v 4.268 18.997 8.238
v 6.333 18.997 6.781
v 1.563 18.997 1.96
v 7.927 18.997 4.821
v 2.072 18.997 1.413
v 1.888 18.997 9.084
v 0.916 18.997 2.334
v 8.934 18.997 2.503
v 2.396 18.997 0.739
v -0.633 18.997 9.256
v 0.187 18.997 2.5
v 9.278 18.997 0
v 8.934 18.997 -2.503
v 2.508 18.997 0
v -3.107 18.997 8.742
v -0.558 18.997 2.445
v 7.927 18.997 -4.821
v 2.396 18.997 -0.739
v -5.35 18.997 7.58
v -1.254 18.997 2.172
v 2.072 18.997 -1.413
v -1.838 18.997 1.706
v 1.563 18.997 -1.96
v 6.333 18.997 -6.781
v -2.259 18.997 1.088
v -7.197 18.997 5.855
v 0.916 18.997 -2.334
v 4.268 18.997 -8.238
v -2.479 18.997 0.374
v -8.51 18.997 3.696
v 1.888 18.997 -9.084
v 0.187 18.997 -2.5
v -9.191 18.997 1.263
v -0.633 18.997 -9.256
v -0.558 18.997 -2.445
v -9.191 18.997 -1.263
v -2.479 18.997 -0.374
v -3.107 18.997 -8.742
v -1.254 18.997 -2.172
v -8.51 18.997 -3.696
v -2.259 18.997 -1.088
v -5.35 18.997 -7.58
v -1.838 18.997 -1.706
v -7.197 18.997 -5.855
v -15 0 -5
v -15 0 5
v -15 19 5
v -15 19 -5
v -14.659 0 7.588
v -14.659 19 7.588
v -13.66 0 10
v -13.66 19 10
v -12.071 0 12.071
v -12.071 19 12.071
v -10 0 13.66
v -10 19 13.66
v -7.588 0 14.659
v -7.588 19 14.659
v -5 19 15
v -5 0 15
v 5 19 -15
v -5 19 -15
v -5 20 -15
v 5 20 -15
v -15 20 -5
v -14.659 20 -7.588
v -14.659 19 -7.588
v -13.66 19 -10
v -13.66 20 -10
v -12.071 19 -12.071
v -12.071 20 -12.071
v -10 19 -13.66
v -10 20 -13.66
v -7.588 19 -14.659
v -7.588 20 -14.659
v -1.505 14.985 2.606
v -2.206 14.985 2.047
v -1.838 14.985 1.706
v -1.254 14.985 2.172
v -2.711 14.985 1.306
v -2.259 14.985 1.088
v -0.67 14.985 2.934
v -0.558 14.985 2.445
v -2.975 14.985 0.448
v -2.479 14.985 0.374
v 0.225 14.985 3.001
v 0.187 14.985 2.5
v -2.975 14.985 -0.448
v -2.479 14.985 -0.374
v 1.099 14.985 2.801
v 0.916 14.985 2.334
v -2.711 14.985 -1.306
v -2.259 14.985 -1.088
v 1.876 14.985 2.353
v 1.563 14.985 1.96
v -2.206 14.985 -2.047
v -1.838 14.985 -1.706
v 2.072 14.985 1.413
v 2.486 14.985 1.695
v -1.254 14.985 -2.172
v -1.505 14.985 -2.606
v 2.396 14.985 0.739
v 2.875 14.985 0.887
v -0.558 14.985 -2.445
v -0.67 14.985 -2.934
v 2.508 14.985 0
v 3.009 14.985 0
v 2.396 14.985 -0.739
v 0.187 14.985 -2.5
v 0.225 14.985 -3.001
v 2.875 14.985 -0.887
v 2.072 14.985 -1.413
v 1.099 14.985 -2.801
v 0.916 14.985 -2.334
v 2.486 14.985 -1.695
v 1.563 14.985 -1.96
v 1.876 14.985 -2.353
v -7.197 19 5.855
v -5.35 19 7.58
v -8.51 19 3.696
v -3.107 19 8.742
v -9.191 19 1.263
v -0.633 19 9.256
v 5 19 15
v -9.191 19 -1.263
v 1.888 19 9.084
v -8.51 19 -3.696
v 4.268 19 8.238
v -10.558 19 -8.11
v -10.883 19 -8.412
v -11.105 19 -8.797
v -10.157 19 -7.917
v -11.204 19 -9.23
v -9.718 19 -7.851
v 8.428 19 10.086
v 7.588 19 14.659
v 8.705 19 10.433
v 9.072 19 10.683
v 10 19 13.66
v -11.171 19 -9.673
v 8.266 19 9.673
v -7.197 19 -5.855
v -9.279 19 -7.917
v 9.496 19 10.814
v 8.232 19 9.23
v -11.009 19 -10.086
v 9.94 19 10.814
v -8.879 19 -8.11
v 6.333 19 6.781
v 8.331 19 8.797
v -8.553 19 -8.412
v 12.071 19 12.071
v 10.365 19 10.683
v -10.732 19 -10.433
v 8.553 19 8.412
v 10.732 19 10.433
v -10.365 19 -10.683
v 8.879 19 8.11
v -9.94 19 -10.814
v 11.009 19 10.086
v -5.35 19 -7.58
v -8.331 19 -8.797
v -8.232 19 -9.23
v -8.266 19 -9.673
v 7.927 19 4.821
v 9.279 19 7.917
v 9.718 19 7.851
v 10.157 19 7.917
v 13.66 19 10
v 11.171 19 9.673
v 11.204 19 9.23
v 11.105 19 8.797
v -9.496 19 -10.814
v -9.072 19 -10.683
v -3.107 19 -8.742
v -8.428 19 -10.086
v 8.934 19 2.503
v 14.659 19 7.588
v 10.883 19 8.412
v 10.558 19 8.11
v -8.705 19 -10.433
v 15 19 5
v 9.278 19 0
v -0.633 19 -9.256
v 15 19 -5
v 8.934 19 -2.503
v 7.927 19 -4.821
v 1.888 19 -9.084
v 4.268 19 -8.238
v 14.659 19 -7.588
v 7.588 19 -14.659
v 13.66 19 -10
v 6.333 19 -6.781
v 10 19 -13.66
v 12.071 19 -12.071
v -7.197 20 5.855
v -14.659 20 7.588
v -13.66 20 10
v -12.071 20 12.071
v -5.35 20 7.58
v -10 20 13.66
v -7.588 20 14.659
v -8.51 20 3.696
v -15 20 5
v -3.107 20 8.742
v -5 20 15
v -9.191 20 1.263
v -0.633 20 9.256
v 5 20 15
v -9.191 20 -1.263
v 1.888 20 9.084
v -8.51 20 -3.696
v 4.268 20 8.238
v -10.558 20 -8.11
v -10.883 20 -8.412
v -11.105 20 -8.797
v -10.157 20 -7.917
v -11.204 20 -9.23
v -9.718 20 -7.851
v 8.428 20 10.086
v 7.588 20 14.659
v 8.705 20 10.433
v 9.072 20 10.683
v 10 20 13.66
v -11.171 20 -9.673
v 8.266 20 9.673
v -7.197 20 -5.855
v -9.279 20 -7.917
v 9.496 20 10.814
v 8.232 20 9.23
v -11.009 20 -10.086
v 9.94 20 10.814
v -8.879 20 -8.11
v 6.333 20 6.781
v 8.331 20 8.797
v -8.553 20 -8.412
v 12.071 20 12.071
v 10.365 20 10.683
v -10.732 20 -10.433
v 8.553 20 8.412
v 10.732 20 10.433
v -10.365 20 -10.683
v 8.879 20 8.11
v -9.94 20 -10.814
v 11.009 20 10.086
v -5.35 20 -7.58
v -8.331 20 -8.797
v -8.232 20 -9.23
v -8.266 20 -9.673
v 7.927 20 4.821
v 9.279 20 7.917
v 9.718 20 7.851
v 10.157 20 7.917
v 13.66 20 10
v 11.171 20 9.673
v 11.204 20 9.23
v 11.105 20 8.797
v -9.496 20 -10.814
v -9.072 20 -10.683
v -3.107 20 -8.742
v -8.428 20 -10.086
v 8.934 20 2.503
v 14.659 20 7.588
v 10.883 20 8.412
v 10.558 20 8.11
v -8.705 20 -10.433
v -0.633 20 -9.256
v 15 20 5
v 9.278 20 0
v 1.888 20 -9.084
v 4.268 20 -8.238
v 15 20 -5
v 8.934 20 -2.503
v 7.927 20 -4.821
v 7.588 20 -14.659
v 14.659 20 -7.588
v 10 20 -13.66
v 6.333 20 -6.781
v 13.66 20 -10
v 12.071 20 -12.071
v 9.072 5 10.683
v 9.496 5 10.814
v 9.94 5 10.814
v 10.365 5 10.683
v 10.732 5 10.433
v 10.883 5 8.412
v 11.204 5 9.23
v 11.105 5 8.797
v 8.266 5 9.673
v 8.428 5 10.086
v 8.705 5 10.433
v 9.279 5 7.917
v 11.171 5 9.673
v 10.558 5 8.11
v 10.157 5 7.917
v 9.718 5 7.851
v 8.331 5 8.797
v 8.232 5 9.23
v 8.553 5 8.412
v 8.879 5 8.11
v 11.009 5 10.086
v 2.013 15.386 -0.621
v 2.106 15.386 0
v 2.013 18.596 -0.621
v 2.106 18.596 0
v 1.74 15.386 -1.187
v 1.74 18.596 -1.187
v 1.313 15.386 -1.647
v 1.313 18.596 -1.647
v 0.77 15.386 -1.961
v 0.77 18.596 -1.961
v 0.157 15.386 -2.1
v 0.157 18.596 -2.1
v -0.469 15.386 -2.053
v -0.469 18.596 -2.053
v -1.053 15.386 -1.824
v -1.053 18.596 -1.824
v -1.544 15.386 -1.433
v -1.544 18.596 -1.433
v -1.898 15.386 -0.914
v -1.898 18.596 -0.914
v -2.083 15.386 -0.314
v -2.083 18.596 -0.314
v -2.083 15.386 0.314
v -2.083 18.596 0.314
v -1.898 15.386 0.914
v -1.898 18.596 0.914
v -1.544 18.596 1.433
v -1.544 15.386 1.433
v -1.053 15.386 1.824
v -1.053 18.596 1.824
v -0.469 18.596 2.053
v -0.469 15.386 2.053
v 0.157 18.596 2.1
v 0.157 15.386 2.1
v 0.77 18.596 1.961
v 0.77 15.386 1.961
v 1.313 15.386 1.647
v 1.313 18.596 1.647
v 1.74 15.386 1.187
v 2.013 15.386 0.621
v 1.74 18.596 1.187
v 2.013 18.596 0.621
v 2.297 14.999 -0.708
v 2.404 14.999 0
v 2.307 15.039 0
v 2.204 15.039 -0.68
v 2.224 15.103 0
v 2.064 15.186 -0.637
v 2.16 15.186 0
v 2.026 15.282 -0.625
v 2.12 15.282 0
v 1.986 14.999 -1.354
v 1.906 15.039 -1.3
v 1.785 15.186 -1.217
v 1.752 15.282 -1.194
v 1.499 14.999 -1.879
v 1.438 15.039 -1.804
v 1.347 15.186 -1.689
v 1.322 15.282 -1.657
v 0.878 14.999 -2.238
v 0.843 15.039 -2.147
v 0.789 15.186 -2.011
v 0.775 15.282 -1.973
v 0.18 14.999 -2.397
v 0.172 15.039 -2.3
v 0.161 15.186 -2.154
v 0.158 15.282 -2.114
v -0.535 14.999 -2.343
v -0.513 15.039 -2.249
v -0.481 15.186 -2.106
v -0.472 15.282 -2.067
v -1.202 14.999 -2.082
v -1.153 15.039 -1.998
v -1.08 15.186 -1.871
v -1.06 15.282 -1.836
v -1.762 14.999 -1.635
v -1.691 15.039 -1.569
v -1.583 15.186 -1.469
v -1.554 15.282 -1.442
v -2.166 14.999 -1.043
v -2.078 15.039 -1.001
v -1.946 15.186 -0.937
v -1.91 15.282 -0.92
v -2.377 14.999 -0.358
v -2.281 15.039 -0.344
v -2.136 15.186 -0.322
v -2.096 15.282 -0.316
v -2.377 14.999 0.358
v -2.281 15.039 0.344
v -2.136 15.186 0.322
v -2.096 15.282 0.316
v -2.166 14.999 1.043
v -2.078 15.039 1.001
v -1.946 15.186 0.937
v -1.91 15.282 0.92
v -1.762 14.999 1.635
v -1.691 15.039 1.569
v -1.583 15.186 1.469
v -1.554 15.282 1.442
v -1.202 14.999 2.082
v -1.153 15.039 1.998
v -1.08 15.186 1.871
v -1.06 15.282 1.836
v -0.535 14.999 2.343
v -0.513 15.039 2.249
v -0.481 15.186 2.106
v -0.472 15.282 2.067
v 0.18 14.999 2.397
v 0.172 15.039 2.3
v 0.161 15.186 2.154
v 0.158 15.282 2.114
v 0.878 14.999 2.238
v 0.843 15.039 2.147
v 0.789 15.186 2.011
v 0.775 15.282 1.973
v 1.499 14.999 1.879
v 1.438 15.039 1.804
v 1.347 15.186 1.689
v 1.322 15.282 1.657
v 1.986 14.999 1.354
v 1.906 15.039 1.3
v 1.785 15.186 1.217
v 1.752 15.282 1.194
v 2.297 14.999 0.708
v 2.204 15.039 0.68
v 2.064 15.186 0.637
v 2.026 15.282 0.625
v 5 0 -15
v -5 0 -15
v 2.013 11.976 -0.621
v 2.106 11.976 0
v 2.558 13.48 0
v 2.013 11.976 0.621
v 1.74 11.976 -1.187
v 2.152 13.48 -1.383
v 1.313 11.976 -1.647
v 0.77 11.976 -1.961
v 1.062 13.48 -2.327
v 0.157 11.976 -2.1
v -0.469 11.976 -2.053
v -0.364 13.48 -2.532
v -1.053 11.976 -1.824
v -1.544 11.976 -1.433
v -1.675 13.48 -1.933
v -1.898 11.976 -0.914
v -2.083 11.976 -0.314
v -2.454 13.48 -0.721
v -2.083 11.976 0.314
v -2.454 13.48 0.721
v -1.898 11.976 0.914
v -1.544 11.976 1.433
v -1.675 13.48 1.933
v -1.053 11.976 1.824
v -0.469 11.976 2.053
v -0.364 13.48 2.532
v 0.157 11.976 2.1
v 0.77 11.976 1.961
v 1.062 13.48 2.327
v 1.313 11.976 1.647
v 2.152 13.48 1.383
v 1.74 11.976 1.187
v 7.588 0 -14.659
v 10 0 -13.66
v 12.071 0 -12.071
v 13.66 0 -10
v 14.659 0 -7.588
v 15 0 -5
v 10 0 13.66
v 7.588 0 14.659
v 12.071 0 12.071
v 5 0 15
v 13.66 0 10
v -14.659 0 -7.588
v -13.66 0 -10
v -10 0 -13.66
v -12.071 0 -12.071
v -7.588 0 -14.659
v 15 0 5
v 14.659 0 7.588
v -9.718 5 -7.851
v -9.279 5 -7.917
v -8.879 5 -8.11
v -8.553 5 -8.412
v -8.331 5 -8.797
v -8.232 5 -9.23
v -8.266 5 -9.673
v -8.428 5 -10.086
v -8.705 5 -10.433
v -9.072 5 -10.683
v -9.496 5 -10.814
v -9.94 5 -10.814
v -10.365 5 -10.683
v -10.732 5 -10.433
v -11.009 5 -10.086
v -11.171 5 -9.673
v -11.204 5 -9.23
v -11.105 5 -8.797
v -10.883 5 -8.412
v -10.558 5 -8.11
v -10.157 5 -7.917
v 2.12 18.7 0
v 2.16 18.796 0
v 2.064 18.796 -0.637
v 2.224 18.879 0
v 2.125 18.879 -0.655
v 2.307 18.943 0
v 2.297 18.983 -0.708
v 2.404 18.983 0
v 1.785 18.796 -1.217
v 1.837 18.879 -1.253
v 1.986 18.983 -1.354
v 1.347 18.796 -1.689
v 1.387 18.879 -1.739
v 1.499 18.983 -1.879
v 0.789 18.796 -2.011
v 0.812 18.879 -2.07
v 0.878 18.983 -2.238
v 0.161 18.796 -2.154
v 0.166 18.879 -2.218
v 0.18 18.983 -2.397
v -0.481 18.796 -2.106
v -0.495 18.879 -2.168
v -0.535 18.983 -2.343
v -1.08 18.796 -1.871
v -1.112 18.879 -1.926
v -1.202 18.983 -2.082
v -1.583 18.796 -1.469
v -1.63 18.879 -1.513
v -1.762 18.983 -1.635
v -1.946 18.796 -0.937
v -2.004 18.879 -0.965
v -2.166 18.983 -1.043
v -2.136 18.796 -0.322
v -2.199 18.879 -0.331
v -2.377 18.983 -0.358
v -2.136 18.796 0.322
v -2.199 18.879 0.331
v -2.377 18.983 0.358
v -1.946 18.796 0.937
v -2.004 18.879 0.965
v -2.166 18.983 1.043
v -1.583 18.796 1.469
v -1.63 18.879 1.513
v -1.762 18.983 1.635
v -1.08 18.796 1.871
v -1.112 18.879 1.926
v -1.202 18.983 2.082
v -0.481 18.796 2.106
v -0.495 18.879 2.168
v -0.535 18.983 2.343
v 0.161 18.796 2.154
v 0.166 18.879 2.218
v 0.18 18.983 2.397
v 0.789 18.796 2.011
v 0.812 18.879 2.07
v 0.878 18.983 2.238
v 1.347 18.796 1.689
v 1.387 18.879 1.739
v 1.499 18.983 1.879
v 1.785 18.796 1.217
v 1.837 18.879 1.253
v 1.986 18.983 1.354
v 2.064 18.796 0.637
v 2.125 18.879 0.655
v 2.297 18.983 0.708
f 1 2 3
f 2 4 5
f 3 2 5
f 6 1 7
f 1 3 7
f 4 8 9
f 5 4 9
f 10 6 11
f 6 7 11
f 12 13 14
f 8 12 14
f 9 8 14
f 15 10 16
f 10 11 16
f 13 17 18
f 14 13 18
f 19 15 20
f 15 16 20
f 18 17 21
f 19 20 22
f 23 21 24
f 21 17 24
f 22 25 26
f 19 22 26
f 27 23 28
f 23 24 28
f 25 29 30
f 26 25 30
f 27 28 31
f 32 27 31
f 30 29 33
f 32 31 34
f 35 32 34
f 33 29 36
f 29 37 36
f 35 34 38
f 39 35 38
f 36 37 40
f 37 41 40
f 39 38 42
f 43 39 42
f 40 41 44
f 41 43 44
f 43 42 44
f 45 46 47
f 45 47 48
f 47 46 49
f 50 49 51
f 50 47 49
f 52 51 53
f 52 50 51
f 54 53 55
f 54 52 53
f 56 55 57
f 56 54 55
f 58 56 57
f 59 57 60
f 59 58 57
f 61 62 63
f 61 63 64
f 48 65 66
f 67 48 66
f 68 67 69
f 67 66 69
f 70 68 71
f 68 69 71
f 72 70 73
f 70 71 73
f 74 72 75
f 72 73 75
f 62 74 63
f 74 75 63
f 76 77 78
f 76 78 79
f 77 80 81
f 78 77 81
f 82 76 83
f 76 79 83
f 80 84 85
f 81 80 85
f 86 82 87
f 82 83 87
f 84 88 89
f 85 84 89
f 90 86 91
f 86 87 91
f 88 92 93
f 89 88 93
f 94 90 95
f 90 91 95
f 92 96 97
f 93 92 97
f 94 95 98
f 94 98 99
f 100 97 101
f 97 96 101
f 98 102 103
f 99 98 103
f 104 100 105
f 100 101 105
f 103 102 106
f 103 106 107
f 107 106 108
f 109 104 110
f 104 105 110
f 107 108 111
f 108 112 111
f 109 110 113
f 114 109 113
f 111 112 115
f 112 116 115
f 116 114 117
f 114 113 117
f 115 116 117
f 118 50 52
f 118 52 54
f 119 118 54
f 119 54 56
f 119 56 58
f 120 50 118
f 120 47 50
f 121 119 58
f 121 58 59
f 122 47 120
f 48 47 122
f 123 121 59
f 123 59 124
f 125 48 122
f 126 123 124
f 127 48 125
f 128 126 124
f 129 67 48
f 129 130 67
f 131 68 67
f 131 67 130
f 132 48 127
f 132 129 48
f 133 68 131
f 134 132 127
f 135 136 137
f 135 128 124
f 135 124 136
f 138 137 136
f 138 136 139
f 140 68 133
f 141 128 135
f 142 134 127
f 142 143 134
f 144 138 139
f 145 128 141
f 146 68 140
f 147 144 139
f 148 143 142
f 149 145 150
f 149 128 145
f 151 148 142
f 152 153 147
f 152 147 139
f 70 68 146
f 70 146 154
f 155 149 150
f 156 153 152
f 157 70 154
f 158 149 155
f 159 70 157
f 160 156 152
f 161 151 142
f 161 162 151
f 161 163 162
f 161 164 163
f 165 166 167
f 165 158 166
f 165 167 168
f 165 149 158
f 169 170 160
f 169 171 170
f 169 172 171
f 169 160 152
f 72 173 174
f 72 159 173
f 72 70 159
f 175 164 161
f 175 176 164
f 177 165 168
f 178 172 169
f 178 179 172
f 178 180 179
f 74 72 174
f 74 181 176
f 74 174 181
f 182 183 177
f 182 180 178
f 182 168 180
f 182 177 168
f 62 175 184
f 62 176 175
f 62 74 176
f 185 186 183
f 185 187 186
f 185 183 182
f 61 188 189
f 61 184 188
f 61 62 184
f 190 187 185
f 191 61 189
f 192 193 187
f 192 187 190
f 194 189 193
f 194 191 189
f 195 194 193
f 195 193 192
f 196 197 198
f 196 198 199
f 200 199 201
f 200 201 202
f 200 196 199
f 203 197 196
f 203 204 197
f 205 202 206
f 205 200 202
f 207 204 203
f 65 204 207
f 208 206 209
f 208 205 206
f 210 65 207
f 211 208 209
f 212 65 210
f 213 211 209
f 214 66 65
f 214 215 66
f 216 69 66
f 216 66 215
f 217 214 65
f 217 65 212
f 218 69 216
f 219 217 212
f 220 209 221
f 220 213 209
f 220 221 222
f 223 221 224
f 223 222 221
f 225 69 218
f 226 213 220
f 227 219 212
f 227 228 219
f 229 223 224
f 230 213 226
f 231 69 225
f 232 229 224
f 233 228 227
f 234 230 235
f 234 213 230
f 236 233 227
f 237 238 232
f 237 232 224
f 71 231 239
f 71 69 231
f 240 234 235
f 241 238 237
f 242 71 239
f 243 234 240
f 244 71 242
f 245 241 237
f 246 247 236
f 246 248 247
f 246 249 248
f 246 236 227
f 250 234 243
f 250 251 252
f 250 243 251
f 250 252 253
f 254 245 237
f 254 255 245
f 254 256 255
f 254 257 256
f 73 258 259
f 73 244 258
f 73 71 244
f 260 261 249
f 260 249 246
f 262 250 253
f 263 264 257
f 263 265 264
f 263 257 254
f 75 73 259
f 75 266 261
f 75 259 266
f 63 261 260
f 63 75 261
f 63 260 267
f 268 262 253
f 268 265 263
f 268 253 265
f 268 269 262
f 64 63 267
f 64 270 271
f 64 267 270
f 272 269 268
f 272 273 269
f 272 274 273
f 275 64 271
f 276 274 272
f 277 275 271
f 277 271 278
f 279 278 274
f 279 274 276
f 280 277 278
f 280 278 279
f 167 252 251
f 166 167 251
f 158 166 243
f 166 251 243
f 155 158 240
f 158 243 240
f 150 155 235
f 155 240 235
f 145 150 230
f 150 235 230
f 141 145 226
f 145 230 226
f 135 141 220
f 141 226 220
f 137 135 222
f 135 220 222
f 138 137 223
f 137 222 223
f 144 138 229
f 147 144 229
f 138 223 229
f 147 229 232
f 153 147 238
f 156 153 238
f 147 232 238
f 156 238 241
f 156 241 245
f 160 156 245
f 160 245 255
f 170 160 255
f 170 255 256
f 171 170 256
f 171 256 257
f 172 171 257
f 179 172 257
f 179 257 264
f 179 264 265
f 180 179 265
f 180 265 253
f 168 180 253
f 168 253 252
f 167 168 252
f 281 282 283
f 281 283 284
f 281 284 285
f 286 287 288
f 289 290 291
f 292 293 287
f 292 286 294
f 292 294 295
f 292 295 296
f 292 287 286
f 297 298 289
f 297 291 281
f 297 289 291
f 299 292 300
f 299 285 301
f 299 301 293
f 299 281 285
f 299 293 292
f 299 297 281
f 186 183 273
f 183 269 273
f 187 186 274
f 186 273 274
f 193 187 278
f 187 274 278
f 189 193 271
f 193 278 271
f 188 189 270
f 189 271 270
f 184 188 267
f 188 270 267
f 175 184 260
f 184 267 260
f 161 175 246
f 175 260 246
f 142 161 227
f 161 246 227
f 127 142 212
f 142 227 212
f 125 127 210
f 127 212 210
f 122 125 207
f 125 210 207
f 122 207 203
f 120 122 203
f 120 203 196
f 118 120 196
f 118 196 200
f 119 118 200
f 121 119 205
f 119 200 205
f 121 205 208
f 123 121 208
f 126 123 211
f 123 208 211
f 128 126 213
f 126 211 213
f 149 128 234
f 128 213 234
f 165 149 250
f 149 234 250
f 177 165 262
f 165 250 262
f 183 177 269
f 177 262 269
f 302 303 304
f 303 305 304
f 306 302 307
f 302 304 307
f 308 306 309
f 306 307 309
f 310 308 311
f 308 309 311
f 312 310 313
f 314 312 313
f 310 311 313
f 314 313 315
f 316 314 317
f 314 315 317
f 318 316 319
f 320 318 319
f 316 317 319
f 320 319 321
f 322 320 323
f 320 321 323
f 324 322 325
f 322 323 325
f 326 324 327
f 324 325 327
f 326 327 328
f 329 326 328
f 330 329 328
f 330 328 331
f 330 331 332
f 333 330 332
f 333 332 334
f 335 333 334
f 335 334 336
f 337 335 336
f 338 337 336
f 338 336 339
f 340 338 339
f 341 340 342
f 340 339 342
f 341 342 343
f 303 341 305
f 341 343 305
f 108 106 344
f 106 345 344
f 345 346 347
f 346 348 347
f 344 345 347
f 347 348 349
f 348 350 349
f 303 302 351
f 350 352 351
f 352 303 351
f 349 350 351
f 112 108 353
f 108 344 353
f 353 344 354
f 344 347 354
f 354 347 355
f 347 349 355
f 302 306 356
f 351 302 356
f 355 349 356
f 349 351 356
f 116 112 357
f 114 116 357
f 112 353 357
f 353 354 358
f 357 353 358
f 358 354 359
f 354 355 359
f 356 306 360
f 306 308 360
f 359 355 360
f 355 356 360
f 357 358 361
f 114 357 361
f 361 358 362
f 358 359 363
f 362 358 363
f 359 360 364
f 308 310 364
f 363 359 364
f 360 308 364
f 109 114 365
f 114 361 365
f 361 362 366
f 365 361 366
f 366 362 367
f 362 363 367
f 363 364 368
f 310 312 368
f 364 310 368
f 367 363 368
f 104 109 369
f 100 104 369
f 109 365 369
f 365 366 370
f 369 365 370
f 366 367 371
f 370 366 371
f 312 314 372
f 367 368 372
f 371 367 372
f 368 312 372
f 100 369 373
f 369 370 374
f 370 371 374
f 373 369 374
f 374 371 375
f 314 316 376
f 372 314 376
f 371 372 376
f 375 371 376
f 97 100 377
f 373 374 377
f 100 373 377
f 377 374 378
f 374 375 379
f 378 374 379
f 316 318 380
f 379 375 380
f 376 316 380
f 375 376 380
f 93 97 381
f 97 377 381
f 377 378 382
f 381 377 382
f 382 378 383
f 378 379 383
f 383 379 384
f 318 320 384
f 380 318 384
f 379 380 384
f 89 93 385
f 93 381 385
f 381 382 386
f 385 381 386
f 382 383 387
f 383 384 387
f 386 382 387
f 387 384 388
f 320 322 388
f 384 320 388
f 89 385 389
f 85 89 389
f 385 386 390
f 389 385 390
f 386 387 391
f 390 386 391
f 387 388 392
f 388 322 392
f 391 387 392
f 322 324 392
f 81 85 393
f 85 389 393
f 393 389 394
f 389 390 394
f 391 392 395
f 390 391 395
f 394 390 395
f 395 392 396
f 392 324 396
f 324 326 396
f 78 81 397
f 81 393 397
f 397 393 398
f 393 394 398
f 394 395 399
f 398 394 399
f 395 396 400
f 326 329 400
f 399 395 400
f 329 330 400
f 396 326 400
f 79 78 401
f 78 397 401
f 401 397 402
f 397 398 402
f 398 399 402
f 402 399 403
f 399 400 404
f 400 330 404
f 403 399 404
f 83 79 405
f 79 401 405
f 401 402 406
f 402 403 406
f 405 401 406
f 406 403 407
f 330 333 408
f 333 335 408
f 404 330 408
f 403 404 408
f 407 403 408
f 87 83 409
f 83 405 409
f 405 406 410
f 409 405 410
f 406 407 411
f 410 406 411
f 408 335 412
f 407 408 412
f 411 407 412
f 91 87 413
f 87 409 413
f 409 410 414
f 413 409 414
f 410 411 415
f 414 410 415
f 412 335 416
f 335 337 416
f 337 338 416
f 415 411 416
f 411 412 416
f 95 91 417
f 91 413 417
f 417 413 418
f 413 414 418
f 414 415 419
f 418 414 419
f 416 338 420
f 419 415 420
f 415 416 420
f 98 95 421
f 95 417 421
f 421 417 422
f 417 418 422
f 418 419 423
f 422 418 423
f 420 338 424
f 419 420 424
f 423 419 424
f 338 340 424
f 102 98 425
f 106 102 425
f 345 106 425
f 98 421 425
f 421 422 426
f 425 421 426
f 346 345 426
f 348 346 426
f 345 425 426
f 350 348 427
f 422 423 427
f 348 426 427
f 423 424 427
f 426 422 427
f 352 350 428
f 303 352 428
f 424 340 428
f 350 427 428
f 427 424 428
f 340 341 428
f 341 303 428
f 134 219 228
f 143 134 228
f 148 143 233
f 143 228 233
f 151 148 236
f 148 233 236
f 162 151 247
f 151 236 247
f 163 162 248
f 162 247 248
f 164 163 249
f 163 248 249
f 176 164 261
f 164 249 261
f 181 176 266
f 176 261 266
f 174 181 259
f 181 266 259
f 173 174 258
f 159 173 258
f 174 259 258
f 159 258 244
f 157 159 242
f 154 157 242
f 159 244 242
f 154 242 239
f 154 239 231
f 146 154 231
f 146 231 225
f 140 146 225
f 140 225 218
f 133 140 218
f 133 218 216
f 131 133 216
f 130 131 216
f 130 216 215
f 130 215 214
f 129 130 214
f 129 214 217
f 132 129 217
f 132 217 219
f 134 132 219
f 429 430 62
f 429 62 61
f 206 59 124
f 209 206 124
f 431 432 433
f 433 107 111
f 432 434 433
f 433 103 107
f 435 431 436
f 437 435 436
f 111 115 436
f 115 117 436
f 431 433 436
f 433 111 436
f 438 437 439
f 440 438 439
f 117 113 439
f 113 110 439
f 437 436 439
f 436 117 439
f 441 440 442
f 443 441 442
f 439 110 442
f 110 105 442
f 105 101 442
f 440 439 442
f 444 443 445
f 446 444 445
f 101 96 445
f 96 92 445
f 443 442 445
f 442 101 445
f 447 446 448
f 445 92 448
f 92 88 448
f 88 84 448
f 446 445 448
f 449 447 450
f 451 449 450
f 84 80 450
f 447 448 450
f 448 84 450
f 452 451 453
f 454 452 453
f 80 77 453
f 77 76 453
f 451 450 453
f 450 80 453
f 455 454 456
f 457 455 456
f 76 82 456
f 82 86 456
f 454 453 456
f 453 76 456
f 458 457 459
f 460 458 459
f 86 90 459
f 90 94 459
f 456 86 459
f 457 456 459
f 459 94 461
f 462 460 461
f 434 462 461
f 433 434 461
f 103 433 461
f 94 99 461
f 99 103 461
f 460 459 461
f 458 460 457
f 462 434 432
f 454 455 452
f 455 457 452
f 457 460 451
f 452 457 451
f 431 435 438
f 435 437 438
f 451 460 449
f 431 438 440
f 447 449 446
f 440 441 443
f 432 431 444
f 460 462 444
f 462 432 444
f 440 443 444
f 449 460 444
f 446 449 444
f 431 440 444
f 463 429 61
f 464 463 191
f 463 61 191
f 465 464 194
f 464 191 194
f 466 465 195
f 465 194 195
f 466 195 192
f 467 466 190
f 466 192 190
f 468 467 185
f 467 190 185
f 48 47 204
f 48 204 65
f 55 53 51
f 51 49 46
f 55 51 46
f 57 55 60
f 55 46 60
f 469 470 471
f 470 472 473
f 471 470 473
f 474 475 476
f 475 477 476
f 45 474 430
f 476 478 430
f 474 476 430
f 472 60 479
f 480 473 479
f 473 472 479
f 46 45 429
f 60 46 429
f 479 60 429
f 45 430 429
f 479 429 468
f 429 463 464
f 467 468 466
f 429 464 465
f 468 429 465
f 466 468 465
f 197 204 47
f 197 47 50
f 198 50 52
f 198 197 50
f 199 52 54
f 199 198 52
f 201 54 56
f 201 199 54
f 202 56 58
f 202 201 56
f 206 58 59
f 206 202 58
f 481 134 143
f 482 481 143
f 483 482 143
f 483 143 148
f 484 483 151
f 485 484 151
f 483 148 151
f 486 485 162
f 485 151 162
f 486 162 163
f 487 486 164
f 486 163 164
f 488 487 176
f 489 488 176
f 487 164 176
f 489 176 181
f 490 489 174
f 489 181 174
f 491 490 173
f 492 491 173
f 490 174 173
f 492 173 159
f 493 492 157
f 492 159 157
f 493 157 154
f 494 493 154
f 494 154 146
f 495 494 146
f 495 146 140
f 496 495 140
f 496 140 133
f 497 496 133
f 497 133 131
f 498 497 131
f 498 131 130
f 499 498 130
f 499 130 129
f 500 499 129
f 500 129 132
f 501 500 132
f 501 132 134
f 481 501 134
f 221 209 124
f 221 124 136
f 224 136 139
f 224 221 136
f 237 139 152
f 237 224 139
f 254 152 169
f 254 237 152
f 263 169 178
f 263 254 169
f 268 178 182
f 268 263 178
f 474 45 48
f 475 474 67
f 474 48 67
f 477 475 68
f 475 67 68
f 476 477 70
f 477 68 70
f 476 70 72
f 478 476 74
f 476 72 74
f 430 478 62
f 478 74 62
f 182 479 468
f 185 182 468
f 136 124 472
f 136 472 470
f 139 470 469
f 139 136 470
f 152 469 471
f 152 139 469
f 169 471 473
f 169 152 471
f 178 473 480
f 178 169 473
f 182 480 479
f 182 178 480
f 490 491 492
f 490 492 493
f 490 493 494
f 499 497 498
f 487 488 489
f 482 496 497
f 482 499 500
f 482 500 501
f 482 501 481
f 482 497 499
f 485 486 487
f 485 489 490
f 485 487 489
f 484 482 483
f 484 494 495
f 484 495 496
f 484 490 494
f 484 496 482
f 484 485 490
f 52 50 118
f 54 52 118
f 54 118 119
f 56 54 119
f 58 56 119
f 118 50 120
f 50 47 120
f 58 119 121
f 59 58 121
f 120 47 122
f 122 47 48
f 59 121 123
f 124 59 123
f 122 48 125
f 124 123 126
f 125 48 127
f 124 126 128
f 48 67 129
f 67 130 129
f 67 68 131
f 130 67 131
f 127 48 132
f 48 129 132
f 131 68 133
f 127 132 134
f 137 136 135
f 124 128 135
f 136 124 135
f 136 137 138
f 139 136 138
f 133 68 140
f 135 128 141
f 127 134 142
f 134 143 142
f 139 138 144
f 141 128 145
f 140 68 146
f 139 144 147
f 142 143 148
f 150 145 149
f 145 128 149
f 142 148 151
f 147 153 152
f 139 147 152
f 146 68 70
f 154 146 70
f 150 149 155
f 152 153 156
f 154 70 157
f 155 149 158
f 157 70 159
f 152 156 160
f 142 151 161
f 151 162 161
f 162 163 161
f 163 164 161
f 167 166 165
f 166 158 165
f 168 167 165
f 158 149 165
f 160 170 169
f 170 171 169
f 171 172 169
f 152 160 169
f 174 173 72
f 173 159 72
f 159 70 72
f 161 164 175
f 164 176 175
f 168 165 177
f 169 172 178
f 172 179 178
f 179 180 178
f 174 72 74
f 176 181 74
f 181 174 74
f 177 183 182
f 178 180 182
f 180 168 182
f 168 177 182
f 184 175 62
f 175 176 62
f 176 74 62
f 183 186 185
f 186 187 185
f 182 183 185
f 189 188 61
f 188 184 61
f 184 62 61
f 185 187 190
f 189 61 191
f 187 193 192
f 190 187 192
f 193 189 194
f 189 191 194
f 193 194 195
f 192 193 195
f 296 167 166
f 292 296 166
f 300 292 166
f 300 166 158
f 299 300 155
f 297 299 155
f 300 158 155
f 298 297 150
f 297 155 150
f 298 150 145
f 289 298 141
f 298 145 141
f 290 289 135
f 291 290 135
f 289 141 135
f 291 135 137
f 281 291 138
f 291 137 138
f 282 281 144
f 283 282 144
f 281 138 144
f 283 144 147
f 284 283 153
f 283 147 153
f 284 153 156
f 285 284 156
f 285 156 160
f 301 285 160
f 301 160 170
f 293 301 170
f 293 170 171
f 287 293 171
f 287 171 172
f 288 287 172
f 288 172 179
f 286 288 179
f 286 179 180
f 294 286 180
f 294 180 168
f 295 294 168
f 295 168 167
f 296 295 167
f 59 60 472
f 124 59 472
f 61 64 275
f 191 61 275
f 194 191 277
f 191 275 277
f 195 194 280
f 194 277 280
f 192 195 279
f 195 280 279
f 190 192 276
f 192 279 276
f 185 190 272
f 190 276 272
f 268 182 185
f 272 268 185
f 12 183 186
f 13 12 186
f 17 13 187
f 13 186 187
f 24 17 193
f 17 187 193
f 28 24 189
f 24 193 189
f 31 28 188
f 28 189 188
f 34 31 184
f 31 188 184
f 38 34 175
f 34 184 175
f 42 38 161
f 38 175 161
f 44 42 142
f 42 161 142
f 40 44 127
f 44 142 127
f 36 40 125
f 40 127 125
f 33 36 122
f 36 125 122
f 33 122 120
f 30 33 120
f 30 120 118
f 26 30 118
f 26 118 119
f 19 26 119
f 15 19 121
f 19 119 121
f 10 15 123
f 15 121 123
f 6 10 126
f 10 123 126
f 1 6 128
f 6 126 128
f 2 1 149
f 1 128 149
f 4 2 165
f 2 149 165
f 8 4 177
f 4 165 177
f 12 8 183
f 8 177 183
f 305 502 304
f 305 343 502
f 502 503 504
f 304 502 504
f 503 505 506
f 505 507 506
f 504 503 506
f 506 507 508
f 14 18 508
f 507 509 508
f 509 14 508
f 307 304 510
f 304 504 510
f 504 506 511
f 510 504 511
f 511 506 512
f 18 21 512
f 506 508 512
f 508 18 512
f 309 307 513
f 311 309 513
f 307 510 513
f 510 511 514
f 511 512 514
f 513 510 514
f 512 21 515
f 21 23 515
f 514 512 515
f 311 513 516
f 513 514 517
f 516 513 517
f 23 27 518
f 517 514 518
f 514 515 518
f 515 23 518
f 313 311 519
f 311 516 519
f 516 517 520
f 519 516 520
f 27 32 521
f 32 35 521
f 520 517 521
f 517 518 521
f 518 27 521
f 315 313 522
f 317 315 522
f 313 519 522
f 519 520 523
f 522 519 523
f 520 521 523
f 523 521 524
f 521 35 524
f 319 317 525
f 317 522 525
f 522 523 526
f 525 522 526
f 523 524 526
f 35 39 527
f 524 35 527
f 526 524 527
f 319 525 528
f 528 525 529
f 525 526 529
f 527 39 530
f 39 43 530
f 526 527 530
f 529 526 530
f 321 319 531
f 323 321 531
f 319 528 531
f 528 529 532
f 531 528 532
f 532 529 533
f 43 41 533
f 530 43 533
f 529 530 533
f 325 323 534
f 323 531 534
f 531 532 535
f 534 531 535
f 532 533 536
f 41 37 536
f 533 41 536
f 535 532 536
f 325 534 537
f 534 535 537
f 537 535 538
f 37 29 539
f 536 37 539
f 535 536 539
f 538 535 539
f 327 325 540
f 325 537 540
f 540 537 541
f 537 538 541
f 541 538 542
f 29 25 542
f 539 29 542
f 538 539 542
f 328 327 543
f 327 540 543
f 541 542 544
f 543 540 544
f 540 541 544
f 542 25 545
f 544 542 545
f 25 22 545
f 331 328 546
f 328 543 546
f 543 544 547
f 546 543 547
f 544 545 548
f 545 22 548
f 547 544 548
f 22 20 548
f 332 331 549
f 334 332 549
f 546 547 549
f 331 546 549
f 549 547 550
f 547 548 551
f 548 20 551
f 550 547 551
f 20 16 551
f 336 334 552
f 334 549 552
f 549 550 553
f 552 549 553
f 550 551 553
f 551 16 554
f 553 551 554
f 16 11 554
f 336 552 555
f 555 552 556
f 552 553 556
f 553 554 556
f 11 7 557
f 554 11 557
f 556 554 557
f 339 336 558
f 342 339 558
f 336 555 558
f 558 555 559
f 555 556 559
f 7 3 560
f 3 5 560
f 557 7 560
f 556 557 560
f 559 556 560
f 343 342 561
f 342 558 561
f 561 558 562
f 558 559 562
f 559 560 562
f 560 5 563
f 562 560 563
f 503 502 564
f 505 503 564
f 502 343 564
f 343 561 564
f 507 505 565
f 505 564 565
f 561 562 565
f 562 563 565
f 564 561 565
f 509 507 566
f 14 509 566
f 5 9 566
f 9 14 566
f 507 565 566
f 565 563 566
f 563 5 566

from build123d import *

# Parameters (mm, degrees)
SKIZZE1_W                       = 30
SKIZZE1_H                       = 30
AUFSATZ_LINEAR_AUSTRAGEN1_DEPTH = 20
VERRUNDUNG1_R                   = 10
SKIZZE3_R                       = 1.49
SCHNITT_LINEAR_AUSTRAGEN1_DEPTH = 15
KREISMUSTER1_COUNT              = 2
ABSPALTEN1_SURFACE_1_BACK       = 47.904
ABSPALTEN1_SURFACE_1_DEPTH      = 95.808
ABSPALTEN1_SURFACE_2_BACK       = 47.904
ABSPALTEN1_SURFACE_2_DEPTH      = 95.808


# Read off the part's stored shape, not the designer's step: Formnest1
with BuildPart() as part:
    # Skizze1 → Aufsatz-Linear austragen1 (new body)
    with BuildSketch(Plane(origin=(0, 0, 0), x_dir=(1, 0, 0), z_dir=(0, 1, 0))):
        Rectangle(SKIZZE1_W, SKIZZE1_H)
    extrude(amount=AUFSATZ_LINEAR_AUSTRAGEN1_DEPTH)

    # Formnest1 outline → Formnest1 (revolve, cut)
    with BuildSketch(Plane.XY):
        with BuildLine():
            Line((2.5075, 18.997), (9.27775, 18.997))
            Line((9.27775, 18.997), (9.27775, 20))
            Line((9.27775, 20), (0, 20))
            Line((0, 20), (0, 11.976))
            Line((0, 11.976), (2.1063, 11.976))
            Line((2.1063, 11.976), (3.009, 14.985))
            Line((3.009, 14.985), (2.5075, 14.985))
            ThreePointArc((2.5075, 14.985), (2.223808759, 15.102508759), (2.1063, 15.3862))
            Line((2.1063, 15.3862), (2.1063, 18.5958))
            ThreePointArc((2.1063, 18.5958), (2.223808759, 18.879491241), (2.5075, 18.997))
        make_face()
    revolve(axis=Axis((0, 0, 0), (0, 1, 0)), mode=Mode.SUBTRACT)

    # Verrundung1
    verrundung1_edges = [part.edges().sort_by_distance(p)[0] for p in [
        (-15, 10, -15),
        (15, 10, -15),
        (15, 10, 15),
        (-15, 10, 15),
    ]]
    fillet(verrundung1_edges, radius=VERRUNDUNG1_R)

    # Skizze3 → Schnitt-Linear austragen1 (cut)
    with BuildSketch(Plane(origin=(0, 20, 0), x_dir=(1, 0, 0), z_dir=(0, 1, 0))):
        with Locations(Location((-9.718159066, 9.341055177, 0), (0, 0, 270))):
            Circle(SKIZZE3_R)
    schnitt_linear_austragen1 = extrude(amount=-SCHNITT_LINEAR_AUSTRAGEN1_DEPTH, mode=Mode.SUBTRACT)

    # Kreismuster1: Schnitt-Linear austragen1 ×2 about axis
    kreismuster1_axis = Axis((0, 0, 0), (0, 1, 0))
    for i in range(1, KREISMUSTER1_COUNT):
        add(schnitt_linear_austragen1.rotate(kreismuster1_axis, i * 360 / KREISMUSTER1_COUNT), mode=Mode.SUBTRACT)


with BuildPart() as body_2:
    # Abspalten1: the piece behind the surface
    add(part.part)
    # Abspalten1 surface: a surface, the sketch's curves swept straight by 95.808 mm
    with BuildLine(Plane.XY.offset(15).offset(-ABSPALTEN1_SURFACE_1_BACK), mode=Mode.PRIVATE) as abspalten1_surface_1_path:
        Line((-15, 19), (15, 19))
    abspalten1_surface_1 = Shell.extrude(abspalten1_surface_1_path.wire(), (0 * ABSPALTEN1_SURFACE_1_DEPTH, 0 * ABSPALTEN1_SURFACE_1_DEPTH, 1 * ABSPALTEN1_SURFACE_1_DEPTH))
    split(bisect_by=abspalten1_surface_1, keep=Keep.BOTTOM)


with BuildPart() as part_1:
    add(part.part)

    # Abspalten1: split by a surface, the side it looks to stays
    # Abspalten1 surface: a surface, the sketch's curves swept straight by 95.808 mm
    with BuildLine(Plane.XY.offset(15).offset(-ABSPALTEN1_SURFACE_2_BACK), mode=Mode.PRIVATE) as abspalten1_surface_2_path:
        Line((-15, 19), (15, 19))
    abspalten1_surface_2 = Shell.extrude(abspalten1_surface_2_path.wire(), (0 * ABSPALTEN1_SURFACE_2_DEPTH, 0 * ABSPALTEN1_SURFACE_2_DEPTH, 1 * ABSPALTEN1_SURFACE_2_DEPTH))
    split(bisect_by=abspalten1_surface_2, keep=Keep.TOP)


solid = Compound([body_2.part, part_1.part])
